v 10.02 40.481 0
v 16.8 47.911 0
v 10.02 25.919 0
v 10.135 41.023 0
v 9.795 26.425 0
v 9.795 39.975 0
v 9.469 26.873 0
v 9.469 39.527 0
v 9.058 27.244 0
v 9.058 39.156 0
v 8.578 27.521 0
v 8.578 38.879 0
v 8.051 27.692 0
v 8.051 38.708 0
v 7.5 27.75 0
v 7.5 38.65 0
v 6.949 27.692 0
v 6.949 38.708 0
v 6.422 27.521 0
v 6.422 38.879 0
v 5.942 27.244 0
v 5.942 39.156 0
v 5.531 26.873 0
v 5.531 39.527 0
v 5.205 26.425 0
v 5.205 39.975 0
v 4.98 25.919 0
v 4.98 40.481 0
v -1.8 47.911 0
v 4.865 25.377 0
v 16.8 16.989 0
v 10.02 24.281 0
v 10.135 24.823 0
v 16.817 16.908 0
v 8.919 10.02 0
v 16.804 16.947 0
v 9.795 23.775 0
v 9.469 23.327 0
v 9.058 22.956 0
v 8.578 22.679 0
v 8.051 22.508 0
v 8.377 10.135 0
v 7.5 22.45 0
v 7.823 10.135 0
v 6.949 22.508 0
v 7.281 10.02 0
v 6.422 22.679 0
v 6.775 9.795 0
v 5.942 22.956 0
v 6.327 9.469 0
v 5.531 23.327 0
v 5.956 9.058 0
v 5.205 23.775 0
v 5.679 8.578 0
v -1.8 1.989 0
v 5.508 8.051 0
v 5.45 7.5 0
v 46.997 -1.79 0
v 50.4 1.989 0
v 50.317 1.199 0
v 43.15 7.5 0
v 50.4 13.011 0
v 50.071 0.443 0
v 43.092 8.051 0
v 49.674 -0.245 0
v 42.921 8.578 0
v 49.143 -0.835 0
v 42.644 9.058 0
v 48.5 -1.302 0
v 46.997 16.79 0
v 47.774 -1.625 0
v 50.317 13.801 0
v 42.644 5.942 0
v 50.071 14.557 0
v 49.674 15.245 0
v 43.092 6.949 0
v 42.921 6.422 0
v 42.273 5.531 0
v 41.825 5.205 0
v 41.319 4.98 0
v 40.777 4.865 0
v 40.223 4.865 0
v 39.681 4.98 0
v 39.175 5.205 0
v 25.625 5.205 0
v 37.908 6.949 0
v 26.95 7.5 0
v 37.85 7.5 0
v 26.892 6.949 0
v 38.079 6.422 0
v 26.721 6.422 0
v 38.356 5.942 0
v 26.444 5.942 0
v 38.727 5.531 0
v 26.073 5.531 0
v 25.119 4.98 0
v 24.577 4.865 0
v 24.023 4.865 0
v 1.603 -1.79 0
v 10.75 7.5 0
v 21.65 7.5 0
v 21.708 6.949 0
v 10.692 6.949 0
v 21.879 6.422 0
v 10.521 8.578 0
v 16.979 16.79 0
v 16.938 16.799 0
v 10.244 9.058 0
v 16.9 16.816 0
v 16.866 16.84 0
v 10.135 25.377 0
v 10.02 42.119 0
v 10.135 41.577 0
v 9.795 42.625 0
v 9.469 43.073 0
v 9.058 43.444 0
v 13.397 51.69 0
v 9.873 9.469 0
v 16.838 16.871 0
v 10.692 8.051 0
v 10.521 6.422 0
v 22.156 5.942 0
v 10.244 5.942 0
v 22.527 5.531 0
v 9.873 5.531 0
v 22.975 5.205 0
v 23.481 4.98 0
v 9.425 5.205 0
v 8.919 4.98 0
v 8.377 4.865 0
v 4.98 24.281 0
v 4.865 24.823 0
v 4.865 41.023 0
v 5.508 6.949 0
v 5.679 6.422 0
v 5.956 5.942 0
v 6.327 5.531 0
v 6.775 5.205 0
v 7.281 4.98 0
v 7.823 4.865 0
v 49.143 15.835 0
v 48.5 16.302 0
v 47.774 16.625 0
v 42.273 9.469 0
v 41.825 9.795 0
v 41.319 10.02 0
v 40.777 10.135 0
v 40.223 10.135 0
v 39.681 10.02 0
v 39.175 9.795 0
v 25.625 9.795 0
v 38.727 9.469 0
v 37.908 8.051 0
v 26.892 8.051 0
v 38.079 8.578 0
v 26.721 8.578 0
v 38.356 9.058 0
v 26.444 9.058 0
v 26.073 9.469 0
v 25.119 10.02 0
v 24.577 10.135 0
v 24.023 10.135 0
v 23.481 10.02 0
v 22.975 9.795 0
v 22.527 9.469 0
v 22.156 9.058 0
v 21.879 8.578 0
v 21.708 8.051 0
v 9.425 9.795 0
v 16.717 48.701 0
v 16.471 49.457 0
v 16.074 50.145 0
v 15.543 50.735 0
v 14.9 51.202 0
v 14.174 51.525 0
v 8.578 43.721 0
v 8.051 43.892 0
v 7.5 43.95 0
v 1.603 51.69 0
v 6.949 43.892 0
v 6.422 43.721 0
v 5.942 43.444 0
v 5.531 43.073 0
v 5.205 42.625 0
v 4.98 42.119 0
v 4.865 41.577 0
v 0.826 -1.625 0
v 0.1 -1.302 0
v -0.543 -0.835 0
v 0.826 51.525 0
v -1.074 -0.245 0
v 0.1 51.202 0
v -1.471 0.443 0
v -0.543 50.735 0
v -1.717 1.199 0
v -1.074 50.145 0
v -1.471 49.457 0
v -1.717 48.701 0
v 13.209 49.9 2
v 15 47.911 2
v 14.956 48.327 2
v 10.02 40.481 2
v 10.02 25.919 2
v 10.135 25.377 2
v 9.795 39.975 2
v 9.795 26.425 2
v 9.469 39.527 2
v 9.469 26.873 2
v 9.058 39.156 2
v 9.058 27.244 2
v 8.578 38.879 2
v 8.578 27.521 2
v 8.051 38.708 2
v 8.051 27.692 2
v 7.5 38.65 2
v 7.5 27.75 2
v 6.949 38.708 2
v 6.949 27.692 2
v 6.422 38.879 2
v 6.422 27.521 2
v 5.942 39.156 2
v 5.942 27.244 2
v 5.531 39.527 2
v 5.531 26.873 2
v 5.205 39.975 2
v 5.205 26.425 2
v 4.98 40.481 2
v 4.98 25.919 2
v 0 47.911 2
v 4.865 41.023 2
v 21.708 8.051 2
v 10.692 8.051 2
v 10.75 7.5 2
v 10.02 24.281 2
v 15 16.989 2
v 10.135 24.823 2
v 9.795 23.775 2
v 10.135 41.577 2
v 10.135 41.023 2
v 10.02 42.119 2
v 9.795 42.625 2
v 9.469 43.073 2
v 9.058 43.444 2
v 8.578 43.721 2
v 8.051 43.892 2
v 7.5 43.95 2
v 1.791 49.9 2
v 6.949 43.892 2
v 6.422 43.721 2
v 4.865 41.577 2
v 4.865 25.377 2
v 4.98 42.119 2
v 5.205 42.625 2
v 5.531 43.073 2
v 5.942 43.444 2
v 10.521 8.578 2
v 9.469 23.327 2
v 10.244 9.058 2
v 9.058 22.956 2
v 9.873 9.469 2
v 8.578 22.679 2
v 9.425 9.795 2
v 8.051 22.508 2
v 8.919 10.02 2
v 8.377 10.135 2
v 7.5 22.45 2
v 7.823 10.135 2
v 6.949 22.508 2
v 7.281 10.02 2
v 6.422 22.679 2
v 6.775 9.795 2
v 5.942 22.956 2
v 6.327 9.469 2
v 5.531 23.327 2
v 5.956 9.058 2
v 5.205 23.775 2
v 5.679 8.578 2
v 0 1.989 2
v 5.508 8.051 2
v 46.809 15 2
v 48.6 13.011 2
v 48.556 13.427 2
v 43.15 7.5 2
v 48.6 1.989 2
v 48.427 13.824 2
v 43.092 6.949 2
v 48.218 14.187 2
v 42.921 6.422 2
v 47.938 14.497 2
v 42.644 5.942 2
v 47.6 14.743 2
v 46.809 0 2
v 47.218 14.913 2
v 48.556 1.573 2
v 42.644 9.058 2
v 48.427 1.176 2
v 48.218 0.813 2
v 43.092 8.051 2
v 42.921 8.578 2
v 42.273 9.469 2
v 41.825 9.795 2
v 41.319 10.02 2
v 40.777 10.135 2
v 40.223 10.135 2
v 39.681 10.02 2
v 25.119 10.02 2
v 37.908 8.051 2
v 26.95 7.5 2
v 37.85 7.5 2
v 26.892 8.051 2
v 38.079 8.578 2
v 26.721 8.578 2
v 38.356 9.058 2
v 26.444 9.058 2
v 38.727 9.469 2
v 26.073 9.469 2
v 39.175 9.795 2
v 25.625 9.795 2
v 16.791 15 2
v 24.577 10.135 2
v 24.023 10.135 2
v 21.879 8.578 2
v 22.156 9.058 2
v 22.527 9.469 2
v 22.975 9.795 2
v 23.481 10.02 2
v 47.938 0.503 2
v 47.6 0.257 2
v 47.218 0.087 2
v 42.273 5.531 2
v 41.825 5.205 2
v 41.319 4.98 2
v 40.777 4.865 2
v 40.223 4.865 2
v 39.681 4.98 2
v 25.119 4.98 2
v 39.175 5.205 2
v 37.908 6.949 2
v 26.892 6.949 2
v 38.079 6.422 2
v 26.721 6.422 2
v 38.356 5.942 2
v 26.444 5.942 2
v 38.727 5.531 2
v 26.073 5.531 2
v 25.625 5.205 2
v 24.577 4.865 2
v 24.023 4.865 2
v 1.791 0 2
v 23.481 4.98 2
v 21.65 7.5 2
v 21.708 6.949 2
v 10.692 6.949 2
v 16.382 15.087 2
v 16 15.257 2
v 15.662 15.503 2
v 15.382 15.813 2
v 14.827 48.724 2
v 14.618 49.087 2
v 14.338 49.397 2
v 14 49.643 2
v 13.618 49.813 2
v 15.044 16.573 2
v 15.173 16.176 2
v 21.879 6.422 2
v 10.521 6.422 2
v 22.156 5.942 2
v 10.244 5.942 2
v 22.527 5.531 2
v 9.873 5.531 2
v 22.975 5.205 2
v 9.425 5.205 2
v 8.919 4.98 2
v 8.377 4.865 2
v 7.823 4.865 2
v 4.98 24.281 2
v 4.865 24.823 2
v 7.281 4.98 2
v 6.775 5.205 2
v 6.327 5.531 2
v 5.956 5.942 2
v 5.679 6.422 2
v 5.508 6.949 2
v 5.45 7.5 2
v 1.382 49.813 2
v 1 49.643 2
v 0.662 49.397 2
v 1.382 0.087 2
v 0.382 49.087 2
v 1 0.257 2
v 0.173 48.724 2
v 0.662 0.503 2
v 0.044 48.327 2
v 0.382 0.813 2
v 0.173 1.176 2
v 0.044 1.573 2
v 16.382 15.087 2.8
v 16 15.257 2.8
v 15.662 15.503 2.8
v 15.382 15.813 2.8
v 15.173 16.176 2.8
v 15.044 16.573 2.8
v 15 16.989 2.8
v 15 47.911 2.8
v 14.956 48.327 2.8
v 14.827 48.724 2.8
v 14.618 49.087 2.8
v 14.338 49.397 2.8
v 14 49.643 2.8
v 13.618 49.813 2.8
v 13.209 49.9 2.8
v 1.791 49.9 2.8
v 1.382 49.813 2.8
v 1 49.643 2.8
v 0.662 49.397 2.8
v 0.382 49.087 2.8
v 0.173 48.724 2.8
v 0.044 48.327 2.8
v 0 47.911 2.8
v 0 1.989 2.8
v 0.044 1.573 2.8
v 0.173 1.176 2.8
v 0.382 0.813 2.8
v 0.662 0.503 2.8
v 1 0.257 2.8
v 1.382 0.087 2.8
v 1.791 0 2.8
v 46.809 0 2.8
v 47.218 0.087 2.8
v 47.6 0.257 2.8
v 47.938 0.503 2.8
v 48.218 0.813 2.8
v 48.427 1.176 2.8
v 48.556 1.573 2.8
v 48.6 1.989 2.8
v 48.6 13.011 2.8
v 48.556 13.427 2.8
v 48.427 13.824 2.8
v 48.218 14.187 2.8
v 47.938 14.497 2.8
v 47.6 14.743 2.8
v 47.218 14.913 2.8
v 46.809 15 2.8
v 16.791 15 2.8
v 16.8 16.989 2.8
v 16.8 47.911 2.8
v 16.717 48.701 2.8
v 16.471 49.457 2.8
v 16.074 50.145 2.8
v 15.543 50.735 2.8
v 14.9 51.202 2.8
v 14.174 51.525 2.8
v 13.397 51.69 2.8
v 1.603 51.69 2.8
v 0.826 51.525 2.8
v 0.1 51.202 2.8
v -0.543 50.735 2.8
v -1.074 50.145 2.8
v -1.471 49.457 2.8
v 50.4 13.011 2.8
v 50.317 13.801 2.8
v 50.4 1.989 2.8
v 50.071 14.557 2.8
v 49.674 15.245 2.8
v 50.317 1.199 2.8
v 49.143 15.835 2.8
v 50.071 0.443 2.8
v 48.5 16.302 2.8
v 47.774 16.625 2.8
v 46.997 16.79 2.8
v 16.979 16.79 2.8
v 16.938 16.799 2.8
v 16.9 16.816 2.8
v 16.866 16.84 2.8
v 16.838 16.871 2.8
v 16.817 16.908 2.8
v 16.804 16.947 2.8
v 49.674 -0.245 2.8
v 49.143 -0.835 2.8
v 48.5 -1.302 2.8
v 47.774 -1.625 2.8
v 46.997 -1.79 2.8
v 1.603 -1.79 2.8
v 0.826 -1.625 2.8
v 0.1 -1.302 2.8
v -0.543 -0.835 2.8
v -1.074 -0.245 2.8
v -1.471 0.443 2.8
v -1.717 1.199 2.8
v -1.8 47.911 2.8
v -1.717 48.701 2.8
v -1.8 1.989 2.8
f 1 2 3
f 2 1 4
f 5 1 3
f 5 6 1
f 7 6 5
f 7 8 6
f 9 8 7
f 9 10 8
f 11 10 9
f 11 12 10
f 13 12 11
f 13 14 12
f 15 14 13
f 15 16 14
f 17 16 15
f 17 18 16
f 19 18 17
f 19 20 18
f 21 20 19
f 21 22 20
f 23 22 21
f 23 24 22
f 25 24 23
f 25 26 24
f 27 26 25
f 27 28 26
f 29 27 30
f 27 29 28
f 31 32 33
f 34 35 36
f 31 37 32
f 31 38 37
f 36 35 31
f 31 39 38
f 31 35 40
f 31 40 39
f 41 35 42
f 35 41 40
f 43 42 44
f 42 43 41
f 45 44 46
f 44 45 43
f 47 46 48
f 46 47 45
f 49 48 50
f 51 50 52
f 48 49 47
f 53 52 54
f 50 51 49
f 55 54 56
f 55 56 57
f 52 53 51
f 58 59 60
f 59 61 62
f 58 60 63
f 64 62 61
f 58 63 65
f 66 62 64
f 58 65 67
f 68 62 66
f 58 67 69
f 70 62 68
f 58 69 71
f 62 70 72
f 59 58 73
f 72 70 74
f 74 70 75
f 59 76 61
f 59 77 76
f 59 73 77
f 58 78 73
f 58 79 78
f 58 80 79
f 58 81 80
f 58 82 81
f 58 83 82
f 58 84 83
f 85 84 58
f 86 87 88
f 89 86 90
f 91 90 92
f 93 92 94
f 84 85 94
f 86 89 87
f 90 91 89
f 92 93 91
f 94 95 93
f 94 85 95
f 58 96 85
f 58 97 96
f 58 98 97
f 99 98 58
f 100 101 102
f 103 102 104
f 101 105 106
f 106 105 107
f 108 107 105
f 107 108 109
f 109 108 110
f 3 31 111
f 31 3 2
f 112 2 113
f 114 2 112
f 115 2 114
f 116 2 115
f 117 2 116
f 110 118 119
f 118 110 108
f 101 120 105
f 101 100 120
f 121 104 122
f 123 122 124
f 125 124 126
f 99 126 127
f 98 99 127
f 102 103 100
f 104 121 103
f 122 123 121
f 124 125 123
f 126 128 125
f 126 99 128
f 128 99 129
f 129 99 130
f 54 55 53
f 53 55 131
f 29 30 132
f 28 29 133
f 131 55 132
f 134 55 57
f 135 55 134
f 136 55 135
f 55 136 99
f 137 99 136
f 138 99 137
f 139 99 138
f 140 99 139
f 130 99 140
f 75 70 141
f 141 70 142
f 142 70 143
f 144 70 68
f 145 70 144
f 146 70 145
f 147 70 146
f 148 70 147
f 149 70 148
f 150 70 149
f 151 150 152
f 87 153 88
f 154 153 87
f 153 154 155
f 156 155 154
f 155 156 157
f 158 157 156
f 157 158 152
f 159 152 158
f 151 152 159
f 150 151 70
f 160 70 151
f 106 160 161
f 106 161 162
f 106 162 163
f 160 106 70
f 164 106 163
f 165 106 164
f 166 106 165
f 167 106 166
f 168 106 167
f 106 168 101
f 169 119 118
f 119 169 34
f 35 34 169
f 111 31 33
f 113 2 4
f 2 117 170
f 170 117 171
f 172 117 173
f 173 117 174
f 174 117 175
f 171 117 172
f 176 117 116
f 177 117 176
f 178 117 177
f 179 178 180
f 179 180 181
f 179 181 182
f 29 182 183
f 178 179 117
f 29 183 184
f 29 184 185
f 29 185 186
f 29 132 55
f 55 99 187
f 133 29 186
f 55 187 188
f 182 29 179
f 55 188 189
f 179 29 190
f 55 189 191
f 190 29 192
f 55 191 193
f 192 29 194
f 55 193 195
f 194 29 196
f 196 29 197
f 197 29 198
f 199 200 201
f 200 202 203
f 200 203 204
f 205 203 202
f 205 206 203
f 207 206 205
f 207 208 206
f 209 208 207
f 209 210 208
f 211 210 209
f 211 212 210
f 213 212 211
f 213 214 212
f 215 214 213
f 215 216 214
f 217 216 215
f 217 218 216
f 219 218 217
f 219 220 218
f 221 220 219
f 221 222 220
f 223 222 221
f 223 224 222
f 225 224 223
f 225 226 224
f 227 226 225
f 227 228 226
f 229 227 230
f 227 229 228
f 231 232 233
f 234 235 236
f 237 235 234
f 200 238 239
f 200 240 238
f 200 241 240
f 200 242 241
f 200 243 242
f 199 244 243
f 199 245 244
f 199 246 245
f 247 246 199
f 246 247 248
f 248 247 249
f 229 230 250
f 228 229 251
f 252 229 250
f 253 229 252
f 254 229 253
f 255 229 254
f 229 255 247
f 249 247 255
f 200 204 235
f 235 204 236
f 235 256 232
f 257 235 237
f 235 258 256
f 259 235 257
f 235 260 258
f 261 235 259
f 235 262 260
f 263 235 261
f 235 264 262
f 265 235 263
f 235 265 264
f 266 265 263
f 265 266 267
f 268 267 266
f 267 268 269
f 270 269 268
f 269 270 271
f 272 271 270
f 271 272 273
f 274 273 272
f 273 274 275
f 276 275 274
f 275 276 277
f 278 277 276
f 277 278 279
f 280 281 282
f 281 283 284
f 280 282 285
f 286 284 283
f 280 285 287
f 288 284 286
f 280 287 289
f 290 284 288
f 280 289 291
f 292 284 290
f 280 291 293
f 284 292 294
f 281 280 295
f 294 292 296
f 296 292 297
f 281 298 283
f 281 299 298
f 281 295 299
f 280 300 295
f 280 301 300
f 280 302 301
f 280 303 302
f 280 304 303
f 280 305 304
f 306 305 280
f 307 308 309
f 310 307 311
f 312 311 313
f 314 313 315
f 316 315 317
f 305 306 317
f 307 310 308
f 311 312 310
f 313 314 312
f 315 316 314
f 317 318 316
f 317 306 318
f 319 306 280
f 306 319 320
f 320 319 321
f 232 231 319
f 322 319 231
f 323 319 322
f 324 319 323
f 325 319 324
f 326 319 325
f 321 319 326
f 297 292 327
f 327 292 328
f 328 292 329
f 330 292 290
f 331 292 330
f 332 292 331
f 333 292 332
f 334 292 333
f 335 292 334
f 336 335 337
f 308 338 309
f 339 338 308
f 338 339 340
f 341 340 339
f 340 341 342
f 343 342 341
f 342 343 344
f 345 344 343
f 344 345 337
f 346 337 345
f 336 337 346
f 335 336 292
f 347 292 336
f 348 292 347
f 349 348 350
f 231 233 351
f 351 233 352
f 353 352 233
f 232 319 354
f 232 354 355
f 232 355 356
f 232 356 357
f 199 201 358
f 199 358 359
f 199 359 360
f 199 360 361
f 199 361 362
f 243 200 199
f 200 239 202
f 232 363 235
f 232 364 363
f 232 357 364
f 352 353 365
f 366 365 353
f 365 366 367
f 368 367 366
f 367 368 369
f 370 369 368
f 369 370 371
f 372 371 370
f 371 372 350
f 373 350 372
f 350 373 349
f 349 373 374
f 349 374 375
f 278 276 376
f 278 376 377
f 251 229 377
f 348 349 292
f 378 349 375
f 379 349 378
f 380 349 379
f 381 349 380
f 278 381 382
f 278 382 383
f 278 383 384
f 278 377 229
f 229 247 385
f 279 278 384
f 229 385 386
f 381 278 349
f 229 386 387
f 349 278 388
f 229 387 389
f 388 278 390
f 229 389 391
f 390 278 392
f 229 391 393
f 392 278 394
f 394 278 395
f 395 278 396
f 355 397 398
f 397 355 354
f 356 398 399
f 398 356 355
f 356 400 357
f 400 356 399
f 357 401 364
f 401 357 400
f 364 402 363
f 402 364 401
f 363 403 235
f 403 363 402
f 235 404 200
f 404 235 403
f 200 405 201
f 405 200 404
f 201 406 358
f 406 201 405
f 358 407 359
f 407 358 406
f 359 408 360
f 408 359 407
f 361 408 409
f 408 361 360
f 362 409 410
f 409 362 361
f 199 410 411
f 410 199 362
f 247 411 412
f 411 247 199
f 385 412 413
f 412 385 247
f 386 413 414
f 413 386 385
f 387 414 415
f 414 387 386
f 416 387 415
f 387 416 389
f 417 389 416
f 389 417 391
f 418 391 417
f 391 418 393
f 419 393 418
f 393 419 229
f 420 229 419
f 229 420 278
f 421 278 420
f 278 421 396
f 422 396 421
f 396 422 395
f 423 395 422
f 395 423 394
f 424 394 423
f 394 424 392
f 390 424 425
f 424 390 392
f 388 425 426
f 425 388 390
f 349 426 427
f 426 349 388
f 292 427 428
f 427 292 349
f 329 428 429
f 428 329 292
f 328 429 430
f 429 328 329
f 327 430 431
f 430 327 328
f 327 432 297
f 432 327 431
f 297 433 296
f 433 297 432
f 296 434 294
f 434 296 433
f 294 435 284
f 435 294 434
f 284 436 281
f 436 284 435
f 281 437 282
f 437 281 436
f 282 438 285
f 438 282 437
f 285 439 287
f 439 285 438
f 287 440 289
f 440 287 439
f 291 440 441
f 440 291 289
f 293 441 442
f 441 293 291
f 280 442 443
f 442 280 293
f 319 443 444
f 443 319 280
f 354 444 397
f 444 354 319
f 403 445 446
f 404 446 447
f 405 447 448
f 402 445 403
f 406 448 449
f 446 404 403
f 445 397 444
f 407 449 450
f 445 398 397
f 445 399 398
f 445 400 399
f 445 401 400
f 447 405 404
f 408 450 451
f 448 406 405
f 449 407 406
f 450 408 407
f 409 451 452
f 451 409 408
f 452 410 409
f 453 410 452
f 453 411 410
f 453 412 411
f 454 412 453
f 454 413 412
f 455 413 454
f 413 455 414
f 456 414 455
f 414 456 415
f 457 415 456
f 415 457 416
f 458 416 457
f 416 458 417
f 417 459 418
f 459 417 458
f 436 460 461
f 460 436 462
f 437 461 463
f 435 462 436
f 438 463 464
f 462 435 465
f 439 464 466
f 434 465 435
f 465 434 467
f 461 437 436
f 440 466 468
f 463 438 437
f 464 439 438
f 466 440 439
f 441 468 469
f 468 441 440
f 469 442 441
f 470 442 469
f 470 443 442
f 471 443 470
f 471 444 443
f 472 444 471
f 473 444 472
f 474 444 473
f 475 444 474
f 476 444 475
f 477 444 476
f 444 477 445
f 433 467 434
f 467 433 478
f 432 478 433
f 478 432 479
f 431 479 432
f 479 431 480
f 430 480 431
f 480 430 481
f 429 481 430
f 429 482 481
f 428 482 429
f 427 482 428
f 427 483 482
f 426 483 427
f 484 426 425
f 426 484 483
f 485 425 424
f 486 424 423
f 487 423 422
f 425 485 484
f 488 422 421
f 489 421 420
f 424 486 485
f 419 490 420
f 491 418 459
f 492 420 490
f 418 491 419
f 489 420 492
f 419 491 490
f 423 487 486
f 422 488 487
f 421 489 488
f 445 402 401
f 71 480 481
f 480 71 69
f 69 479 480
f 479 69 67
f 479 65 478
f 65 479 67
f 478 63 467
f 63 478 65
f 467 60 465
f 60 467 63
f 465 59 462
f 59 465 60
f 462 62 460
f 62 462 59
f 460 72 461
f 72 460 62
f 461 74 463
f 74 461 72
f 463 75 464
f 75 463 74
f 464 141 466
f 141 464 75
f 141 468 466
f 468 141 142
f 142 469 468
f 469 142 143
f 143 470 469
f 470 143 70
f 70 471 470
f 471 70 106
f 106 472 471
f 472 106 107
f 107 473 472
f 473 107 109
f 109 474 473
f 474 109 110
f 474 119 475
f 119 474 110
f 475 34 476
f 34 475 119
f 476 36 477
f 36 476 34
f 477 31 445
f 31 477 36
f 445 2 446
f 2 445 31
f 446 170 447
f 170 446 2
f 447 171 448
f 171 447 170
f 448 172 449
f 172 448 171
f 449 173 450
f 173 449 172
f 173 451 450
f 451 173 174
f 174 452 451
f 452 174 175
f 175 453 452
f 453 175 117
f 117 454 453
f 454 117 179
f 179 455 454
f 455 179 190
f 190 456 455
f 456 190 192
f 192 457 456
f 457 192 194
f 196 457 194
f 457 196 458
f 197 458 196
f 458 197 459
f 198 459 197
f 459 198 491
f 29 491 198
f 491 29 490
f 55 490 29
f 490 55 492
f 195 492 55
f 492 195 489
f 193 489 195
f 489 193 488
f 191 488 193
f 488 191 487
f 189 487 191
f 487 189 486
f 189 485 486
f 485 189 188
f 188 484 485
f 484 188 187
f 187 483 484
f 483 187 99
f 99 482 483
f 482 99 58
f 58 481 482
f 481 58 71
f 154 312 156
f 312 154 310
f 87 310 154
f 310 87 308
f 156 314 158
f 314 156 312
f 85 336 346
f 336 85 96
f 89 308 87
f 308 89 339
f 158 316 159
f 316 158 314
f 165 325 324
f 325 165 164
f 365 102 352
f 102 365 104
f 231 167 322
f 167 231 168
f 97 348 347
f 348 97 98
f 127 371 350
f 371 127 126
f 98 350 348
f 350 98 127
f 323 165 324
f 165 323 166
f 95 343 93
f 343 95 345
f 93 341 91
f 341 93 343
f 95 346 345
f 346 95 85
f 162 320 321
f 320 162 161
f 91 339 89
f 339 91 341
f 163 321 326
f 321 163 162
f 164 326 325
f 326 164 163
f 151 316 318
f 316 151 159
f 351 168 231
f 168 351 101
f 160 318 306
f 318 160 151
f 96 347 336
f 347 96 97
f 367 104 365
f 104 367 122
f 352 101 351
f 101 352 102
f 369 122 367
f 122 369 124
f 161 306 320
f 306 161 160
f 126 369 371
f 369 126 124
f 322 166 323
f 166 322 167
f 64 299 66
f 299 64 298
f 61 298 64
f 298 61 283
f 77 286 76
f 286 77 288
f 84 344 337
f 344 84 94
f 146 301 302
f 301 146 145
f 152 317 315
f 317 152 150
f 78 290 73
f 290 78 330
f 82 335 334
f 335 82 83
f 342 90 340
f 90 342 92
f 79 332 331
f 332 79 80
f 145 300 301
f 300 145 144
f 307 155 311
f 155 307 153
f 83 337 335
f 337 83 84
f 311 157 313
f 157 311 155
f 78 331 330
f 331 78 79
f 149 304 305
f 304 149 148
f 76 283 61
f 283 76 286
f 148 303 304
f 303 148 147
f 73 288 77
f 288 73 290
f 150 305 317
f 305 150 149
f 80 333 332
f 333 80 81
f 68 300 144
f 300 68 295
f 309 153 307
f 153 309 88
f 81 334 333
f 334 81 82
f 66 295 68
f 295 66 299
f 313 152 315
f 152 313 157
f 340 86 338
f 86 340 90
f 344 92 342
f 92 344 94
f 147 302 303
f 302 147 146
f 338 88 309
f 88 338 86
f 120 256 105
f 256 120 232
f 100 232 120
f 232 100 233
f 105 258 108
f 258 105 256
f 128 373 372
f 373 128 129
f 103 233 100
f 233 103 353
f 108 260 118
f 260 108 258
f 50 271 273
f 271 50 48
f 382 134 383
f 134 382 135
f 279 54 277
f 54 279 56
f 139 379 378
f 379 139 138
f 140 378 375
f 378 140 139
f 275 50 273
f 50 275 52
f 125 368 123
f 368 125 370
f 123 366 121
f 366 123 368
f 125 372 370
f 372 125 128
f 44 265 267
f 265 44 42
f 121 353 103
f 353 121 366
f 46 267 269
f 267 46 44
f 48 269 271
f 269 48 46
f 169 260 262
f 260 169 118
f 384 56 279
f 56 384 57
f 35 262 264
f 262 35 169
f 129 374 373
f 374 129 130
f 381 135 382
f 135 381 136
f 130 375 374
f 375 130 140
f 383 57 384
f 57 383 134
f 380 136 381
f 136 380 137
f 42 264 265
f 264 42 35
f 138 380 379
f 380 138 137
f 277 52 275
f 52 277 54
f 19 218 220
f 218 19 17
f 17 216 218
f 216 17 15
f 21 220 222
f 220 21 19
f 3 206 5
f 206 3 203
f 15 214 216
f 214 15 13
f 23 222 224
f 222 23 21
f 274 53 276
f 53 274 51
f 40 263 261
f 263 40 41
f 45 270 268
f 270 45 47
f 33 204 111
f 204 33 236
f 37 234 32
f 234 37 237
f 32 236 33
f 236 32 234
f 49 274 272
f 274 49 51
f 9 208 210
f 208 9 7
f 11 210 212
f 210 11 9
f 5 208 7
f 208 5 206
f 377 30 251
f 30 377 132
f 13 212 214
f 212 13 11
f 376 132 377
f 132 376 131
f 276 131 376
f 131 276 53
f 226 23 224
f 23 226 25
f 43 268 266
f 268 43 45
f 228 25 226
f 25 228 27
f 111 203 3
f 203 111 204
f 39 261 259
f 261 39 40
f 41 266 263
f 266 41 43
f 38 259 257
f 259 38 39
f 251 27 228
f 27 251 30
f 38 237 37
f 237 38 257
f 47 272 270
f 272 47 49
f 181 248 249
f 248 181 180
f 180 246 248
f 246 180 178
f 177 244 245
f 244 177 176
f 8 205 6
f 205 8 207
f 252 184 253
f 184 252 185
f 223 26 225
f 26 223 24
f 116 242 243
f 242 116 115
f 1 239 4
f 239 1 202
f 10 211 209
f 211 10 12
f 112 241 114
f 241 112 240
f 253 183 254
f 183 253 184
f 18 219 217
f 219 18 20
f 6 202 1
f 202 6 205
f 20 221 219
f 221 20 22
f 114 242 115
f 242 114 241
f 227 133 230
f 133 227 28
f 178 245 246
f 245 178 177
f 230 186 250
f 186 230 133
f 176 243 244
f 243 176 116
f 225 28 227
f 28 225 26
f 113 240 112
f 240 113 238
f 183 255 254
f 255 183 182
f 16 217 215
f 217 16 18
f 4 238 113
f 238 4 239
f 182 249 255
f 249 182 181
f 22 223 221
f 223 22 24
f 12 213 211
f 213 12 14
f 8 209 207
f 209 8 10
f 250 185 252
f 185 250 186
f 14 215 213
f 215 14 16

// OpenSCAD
// T-Track definition: how wide is it?
trackWidth = 20.0;

// Mounting hardware definition: how long are the inserts you are using?
hardwareLength = 15.2;

// Extra space between T-track mounting brackets
extraSpace = 1.0;

// Screw hole size (make it a bit bigger than your screws)
holeSize = 5.3;

// Lower bar of the L: number of holes
lowerBarNumHoles = 3;

// Vertical bar of the L: number of holes
verticalBarNumHoles = 2;

// The width of the part
mainWidth = 15.0;

// Corner radius:
cornerRadius = 2;

// Main thickness:
thickness = 2.0;

// Rim thickness 
rimThickness = 0.8;

// Rim width
rimWidth = 1.8;

/* [Hidden] */
// Hole resolution
$fn = 30;


// Code imported from scad-utils:
// Copyright (c) 2013 Oskar Linde. All rights reserved.
// License: BSD
//
// This library contains basic 2D morphology operations
//
// outset(d=1)            - creates a polygon at an offset d outside a 2D shape
// inset(d=1)             - creates a polygon at an offset d inside a 2D shape
// fillet(r=1)            - adds fillets of radius r to all concave corners of a 2D shape
// rounding(r=1)          - adds rounding to all convex corners of a 2D shape
// shell(d,center=false)  - makes a shell of width d along the edge of a 2D shape
//                        - positive values of d places the shell on the outside
//                        - negative values of d places the shell on the inside
//                        - center=true and positive d places the shell centered on the edge

module outset(d=1) {
	// Bug workaround for older OpenSCAD versions
	minkowski() {
		circle(r=d);
		children();
	}
}

module outset_extruded(d=1) {
   projection(cut=true) minkowski() {
        cylinder(r=d);
        linear_extrude(center=true) children();
   }
}

module inset(d=1) {
	 render() inverse() outset(d=d) inverse() children();
}

module fillet(r=1) {
	inset(d=r) render() outset(d=r) children();
}

module rounding(r=1) {
	outset(d=r) inset(d=r) children();
}

module shell(d,center=false) {
	if (center && d > 0) {
		difference() {
			outset(d=d/2) children();
			inset(d=d/2) children();
		}
	}
	if (!center && d > 0) {
		difference() {
			outset(d=d) children();
			children();
		}
	}
	if (!center && d < 0) {
		difference() {
			children();
			inset(d=-d) children();
		}
	}
	if (d == 0) children();
}


// Below are for internal use only

module inverse() {
	difference() {
		square(1e5,center=true);
		children();
	}
}




// End import from scad-utils

extraHardwareSpace = (trackWidth - mainWidth) / 2;
lowerBarWidth = lowerBarNumHoles * (hardwareLength+extraSpace);
verticalBarHeight = verticalBarNumHoles * (hardwareLength+extraSpace) + extraHardwareSpace;


module bracket2DSquare () {
    square ([lowerBarWidth,mainWidth]);
    translate ([0,mainWidth,0]) {
        square ([mainWidth, verticalBarHeight]);
    }
}

module bracket2DRounded () {
    rounding(r=cornerRadius) fillet(r=cornerRadius) bracket2DSquare();
}

module rim2D () {
    shell(d=rimWidth) bracket2DRounded ();
}

module bracket3D () {
    linear_extrude (height=thickness) bracket2DRounded ();
    linear_extrude (height=thickness+rimThickness) rim2D();
}

module holePuncher (thisHole, numHoles) {
    if (thisHole < numHoles) {
        cylinder (d = holeSize, h = 4* thickness, center = true);
        translate ([hardwareLength+extraSpace,0,0]) {
            holePuncher (thisHole + 1, numHoles);
        }
    }
}

module punchlowerBarHoles () {
    translate ([(hardwareLength+extraSpace)/2,mainWidth/2,0]) {
        holePuncher(0,lowerBarNumHoles);
    }
}

module punchVerticalBarHoles () {
    translate ([mainWidth/2,mainWidth+extraHardwareSpace+hardwareLength/2,0]) {
        rotate (90) {
            holePuncher(0,verticalBarNumHoles);
        }
    }
}

difference () {
    bracket3D();
    punchlowerBarHoles();
    punchVerticalBarHoles();
}
